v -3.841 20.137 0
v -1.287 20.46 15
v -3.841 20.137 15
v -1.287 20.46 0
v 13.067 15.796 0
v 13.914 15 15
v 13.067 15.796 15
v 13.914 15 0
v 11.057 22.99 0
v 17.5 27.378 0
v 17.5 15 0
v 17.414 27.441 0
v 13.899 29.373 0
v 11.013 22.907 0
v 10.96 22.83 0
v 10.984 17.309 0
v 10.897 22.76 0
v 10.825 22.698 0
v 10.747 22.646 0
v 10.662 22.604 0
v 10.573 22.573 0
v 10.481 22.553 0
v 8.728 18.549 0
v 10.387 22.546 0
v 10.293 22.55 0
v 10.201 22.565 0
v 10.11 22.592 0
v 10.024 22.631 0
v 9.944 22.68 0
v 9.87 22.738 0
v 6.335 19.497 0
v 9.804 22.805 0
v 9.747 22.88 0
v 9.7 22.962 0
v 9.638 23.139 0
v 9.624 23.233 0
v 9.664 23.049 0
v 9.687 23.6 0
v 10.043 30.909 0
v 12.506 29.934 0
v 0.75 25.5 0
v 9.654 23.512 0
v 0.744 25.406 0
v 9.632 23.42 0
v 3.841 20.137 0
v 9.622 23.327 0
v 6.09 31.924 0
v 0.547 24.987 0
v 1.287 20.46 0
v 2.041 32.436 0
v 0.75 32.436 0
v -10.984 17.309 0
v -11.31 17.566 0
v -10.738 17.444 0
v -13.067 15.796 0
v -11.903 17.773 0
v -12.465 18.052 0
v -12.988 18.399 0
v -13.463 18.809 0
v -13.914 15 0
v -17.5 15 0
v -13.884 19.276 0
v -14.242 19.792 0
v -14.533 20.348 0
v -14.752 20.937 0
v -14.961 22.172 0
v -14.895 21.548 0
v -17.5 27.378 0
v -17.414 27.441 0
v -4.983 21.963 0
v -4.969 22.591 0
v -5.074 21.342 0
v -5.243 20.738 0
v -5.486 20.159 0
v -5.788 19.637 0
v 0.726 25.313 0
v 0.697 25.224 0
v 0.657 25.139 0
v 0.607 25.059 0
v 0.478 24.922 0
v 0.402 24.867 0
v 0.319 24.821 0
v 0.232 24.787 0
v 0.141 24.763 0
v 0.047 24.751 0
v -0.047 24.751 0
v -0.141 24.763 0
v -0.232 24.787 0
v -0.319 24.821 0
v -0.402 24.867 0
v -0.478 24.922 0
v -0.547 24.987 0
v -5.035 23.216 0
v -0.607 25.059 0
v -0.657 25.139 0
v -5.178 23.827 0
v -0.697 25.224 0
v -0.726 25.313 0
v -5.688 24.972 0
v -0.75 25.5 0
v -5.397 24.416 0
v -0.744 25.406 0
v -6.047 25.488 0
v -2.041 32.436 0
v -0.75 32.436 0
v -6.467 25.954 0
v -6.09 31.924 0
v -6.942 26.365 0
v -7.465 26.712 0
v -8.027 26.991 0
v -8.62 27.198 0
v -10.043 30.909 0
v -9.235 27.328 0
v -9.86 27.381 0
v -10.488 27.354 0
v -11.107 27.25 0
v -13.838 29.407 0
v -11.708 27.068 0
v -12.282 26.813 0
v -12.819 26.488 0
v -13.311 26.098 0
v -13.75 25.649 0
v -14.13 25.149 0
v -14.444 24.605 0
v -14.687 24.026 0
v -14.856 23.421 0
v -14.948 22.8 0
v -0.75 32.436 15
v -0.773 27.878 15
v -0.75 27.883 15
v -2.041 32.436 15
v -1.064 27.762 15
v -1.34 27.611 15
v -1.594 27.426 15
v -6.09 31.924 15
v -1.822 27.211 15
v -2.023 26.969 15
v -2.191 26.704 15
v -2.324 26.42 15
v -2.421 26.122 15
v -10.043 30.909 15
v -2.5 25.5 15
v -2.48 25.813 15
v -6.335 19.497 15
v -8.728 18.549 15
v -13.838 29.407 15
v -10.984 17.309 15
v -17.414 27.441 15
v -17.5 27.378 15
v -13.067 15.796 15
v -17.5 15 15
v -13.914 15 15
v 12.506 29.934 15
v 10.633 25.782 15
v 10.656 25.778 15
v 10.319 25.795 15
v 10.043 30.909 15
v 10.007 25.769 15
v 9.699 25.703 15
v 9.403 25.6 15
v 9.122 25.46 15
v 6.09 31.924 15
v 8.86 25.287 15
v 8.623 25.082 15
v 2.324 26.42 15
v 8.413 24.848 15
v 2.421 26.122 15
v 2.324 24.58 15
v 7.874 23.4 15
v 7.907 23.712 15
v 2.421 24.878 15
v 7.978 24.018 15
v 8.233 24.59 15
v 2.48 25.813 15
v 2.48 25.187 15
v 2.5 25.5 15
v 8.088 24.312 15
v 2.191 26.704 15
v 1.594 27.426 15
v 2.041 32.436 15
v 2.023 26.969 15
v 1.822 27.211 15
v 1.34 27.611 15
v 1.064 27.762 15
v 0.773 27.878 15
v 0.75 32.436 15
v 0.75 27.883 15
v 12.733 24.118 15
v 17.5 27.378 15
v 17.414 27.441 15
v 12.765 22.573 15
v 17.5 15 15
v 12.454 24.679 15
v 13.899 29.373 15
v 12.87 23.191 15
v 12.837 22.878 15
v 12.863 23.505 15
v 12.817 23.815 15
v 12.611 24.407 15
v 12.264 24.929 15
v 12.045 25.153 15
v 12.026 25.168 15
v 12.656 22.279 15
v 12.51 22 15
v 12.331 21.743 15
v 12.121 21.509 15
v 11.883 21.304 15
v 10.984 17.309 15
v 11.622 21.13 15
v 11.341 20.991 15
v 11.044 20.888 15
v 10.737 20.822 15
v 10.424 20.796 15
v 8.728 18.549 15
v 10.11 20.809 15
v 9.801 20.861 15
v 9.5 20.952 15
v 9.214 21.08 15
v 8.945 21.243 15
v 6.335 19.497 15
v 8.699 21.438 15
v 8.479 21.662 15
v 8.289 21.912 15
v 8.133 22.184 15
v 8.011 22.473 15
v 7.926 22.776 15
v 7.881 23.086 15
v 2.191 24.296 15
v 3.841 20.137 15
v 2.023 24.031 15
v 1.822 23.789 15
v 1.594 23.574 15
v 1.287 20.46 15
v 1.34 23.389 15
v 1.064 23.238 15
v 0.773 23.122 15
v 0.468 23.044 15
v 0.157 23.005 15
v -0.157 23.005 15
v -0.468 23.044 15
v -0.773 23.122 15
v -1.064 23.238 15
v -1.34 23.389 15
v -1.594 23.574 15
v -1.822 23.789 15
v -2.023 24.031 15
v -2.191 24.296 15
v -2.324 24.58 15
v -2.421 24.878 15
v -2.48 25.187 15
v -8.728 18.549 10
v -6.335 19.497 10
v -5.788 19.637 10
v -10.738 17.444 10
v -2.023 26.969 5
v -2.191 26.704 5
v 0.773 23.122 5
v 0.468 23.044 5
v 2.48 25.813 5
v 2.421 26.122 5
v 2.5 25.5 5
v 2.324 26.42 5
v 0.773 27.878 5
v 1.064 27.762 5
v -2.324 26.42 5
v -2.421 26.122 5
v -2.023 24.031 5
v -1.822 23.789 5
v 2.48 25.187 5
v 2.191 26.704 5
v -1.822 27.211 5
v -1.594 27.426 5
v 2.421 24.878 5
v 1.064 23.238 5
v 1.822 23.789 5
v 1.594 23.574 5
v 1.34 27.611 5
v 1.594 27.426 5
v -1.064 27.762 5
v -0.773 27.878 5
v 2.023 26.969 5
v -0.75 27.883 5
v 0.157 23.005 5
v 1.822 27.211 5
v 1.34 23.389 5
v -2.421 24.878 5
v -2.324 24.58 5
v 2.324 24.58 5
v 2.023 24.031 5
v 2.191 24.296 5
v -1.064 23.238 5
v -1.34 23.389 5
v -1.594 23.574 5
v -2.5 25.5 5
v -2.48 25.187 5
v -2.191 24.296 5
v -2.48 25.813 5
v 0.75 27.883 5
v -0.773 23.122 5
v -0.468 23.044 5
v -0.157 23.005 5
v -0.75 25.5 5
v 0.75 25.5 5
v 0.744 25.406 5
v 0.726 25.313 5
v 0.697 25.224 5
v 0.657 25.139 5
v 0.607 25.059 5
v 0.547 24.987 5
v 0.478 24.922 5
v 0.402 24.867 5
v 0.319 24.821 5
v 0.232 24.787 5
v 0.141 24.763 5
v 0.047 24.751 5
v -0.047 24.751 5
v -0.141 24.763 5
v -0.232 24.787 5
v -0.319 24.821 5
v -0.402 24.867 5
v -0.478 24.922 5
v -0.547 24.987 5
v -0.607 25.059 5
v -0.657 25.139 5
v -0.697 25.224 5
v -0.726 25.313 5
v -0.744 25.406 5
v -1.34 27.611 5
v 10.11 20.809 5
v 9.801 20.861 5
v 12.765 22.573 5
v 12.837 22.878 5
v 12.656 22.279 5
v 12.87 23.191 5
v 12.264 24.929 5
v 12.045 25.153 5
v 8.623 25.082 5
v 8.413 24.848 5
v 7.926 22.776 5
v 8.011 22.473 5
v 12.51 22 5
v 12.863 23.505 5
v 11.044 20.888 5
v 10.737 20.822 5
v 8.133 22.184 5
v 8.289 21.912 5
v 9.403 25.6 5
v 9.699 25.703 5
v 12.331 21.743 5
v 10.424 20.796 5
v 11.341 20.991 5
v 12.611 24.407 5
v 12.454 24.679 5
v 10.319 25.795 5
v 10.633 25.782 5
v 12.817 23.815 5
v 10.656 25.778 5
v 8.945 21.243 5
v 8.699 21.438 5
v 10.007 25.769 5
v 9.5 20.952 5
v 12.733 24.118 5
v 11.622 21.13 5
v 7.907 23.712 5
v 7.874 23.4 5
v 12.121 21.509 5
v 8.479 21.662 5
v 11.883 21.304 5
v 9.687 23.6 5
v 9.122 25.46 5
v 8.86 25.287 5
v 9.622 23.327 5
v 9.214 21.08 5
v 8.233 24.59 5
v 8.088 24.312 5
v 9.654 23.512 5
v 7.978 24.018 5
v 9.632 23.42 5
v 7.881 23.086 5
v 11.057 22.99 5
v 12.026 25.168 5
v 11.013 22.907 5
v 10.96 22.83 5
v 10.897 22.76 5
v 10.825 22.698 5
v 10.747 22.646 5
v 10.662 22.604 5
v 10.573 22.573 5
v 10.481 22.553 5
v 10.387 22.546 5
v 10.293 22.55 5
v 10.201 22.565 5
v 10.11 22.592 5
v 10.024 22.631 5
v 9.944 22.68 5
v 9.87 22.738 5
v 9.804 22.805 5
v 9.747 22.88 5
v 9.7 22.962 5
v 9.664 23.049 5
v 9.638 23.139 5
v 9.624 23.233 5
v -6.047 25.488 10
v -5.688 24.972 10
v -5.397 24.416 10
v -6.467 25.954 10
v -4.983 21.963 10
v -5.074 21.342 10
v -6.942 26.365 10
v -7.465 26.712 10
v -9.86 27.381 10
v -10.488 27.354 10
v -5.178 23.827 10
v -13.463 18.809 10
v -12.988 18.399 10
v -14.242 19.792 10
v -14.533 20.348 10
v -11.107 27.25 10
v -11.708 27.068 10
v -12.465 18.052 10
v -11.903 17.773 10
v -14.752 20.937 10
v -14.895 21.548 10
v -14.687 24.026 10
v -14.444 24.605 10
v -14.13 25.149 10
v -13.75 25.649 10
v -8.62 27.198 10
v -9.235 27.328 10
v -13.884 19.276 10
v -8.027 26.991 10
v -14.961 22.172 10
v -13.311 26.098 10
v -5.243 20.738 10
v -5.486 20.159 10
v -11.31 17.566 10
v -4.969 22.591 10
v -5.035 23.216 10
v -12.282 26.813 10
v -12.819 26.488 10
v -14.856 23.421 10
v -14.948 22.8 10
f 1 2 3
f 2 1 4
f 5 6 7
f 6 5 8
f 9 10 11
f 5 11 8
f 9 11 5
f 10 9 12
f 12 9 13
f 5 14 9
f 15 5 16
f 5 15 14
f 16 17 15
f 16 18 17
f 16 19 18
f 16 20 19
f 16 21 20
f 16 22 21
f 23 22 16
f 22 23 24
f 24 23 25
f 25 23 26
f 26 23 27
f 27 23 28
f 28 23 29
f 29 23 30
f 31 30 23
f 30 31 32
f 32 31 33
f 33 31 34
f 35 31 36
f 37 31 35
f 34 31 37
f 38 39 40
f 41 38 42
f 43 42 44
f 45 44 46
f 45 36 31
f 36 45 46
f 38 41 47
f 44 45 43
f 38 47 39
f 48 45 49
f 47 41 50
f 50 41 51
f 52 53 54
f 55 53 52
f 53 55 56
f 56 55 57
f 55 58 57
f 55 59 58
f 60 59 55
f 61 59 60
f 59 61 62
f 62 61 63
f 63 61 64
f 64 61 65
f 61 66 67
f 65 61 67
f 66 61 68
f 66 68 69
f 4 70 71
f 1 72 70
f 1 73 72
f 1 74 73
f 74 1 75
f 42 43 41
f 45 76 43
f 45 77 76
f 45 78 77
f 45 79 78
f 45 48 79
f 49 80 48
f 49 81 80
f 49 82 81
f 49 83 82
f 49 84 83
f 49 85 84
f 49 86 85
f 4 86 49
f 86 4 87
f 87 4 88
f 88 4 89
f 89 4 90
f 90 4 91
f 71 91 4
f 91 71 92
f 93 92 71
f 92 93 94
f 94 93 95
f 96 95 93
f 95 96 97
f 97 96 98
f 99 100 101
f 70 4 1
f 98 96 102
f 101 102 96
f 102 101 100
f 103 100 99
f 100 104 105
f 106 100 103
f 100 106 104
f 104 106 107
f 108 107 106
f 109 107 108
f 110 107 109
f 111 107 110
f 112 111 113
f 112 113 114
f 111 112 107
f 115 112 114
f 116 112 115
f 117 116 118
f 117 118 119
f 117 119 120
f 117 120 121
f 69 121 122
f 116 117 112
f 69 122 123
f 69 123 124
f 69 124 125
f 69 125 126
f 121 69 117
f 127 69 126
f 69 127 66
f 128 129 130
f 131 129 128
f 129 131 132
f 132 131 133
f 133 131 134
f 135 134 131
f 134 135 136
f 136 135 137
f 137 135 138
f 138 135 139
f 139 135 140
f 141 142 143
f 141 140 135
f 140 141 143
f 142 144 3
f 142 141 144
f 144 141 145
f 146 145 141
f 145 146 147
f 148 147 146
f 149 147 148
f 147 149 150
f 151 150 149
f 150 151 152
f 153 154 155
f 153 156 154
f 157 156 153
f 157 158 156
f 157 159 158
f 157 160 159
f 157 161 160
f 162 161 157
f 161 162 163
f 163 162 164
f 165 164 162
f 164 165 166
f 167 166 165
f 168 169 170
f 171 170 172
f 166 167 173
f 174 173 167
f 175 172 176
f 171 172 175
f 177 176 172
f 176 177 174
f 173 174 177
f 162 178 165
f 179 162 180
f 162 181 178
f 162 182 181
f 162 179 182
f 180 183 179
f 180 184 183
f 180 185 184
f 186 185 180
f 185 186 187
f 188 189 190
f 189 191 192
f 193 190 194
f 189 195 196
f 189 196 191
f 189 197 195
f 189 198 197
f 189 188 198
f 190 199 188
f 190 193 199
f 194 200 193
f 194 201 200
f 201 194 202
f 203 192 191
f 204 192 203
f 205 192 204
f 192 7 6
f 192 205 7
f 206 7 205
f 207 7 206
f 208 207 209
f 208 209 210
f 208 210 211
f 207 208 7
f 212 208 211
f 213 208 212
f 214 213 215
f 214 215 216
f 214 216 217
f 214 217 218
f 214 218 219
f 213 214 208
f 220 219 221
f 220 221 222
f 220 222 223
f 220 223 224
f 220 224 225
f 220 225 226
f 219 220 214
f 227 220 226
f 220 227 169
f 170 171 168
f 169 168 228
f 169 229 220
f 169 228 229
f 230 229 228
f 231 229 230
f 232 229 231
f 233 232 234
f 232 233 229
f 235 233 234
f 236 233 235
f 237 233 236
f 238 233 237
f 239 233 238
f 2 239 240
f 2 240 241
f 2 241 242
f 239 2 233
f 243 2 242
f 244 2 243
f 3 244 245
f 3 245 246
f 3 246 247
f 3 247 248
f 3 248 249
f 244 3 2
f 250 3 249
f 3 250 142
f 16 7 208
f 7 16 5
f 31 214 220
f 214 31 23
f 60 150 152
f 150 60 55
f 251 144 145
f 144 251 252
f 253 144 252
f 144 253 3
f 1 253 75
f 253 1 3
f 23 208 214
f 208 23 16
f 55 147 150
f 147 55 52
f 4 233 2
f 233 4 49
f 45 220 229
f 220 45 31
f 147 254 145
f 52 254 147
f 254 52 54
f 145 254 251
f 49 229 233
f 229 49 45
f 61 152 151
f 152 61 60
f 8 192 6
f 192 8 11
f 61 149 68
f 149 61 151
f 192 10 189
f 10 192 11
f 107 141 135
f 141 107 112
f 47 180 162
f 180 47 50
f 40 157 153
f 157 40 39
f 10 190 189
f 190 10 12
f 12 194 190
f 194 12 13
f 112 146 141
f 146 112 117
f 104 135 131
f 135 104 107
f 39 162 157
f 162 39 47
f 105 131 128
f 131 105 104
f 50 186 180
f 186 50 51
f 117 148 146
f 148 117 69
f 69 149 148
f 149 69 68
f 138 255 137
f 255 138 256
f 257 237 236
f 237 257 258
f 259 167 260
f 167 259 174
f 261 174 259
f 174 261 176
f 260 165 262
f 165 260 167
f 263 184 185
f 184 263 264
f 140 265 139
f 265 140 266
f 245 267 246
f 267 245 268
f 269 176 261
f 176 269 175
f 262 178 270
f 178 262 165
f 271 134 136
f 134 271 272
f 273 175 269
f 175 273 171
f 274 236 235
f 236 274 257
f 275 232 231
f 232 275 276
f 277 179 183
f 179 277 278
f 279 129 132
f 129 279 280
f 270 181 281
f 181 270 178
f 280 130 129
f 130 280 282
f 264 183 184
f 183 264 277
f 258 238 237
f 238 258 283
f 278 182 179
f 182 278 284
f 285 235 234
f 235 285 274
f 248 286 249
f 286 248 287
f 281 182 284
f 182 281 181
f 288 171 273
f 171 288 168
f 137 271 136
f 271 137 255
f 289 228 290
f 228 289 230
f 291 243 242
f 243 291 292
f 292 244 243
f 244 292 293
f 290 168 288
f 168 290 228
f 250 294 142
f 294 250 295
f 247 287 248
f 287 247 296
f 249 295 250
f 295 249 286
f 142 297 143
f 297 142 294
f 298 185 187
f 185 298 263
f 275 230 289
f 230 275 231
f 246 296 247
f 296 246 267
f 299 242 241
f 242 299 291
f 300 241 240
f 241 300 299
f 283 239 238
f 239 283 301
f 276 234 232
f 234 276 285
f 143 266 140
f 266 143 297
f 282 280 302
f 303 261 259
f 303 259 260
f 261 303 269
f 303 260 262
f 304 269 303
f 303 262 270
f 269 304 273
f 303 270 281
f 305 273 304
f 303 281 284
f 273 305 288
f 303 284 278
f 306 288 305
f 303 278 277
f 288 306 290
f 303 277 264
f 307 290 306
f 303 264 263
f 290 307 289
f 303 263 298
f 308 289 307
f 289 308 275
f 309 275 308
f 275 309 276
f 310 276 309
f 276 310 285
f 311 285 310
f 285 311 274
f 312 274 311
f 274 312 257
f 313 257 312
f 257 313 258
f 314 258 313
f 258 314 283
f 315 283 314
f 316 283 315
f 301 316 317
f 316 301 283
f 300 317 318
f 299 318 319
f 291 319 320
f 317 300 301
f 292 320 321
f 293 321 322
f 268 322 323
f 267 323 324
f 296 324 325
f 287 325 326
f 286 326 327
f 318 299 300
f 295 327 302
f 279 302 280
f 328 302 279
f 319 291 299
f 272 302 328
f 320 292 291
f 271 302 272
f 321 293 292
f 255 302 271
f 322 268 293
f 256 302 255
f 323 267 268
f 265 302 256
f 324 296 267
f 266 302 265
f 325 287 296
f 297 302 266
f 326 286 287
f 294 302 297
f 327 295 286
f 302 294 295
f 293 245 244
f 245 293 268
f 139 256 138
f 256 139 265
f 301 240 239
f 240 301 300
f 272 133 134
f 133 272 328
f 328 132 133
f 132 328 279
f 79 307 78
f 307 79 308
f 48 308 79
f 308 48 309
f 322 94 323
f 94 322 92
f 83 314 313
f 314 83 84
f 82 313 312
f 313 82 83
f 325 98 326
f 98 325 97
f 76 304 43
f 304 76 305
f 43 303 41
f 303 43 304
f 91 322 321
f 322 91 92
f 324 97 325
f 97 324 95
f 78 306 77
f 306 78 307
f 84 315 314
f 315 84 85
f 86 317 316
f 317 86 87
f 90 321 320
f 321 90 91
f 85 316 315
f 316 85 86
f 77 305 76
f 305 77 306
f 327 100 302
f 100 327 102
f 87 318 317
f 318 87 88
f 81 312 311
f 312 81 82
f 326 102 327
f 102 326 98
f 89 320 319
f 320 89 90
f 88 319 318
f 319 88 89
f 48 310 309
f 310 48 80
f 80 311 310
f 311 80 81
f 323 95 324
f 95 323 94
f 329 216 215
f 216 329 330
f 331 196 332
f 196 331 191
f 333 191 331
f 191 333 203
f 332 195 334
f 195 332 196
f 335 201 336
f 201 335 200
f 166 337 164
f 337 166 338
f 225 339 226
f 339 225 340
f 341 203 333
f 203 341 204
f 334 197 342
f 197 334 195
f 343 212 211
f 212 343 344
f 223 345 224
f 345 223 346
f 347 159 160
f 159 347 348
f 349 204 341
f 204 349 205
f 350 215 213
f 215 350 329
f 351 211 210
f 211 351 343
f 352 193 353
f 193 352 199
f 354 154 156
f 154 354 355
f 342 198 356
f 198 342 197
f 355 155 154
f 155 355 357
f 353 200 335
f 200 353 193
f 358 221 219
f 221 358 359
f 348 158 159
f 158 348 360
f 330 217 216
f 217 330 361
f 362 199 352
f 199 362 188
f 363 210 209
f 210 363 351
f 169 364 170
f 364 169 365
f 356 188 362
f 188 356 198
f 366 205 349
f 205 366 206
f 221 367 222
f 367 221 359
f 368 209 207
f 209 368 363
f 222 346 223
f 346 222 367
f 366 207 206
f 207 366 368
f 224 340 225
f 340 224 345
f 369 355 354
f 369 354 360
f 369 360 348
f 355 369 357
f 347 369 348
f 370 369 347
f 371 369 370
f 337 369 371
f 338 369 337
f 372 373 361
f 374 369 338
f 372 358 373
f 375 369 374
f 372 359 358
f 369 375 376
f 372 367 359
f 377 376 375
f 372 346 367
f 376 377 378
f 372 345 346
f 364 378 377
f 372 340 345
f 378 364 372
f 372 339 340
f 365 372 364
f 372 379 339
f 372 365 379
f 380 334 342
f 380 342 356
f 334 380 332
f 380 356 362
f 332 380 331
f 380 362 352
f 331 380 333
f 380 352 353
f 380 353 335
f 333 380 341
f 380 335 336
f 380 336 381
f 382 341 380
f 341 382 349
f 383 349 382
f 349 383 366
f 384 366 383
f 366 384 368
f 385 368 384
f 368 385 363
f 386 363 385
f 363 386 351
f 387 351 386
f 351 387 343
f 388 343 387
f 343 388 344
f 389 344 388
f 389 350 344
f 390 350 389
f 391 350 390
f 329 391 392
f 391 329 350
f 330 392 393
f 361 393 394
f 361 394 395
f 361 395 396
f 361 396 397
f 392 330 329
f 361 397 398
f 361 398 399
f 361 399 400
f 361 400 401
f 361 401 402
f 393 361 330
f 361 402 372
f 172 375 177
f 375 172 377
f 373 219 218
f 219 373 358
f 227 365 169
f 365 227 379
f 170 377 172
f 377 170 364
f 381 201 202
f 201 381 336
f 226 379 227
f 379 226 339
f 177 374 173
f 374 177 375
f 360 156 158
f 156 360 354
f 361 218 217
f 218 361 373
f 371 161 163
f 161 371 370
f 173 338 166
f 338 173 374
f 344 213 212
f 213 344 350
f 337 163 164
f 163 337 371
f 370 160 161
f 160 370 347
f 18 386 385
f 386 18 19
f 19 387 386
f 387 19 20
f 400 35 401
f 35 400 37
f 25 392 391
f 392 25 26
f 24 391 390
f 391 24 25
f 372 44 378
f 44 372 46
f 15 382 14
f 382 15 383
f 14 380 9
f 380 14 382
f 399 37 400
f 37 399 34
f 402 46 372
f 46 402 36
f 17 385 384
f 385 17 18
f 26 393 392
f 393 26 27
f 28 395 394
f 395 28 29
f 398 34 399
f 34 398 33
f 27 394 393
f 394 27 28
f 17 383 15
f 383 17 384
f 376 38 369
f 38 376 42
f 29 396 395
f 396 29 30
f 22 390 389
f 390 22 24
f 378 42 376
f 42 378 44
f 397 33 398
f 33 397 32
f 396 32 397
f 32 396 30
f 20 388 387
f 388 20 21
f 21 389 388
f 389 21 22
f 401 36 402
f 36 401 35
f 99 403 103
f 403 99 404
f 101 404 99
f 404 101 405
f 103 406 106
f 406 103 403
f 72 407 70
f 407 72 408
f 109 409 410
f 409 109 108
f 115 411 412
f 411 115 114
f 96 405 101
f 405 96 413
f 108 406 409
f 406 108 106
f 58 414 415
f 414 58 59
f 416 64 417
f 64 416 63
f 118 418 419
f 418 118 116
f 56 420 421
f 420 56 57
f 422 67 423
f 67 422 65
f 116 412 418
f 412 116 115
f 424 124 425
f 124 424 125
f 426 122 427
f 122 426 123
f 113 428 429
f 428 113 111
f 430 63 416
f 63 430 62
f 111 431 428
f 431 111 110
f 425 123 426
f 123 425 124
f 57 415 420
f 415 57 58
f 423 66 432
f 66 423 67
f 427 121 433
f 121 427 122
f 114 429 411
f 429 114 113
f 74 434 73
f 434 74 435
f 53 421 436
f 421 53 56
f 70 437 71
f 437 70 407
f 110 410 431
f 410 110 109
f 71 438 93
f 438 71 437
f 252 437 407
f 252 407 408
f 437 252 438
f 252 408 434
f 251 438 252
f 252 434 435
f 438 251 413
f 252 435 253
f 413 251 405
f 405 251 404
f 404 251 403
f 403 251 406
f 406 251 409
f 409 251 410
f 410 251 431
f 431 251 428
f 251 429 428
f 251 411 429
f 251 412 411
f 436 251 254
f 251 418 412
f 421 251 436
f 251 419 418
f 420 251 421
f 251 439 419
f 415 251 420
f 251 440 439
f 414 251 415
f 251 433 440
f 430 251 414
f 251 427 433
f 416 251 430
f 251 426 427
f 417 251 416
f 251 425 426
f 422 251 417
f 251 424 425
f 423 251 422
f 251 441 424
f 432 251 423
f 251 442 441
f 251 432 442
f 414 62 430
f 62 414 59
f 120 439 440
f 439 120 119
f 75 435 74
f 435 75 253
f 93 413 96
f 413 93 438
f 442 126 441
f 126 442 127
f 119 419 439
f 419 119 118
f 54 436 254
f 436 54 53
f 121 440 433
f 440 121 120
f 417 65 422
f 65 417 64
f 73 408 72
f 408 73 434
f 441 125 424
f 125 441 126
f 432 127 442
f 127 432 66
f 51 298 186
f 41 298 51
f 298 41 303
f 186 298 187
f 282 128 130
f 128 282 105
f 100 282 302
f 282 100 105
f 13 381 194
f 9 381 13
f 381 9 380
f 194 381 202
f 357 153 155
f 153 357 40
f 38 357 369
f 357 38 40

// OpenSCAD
//tube diameters
D1=41; // original


//small hole diameters
d1=5; // hose
d2=6; 
d3=10; //existing clamp
$fn=50;


module shape_1(d_inner, d_outer, z){
    
    //D2 = D1 + 2* d3 + 4; //outer tube (for topmost bound)
    //Z = 15;
    SIDE_OFFS = 3;
    
    difference() {
        color("red")
        cylinder(d=d_outer, h=z);

        union() {
            //tube diameter
            color("blue")
            cylinder(d=d_inner, h=z);
            
            //bottom bound 
            translate([-(d_outer/2), -50,0])
            cube([d_outer, d_outer, z]);

            //left bound
            translate([-(d_inner/2)-20 + SIDE_OFFS,0,0])
                cube([20, d_outer, z]);

            //right bound
            translate([d_inner/2 - SIDE_OFFS,0,0])
                cube([20, d_outer, z]);
            
        }
    }
}

module cutout(z){
    zz = 10; //existing hole
    CUTOUT = 1.5;
    
    //left
    rotate([0,0,24])
    translate([0,(D1+d3)/2-1,0]) {        
//        translate([0,0,2]) {
//            cylinder(d=d1, h=z);                        
//        }
        cylinder(d=d3, h=zz);
//        cylinder(d=CUTOUT, h=z);
    }
    
    //rotate([0,0,24])
    //translate([-CUTOUT/2,(D1+d3)/2,0]) 
    //cube([CUTOUT,d3,z]);

    
    //middle
    translate([0,(D1+d3)/2,0]){
        translate([0,0,5]) {
            cylinder(d=d1, h=z);
        }
        cylinder(d=CUTOUT, h=z);
    }
        
    translate([-CUTOUT/2,(D1+d3)/2,0]) 
    cube([CUTOUT,d3,z]);
    
    //right

    rotate([0,0,-24])
    translate([0,(D1+d3)/2,0]){
        translate([0,0,5]) {
            cylinder(d=d1, h=z);
        }
        cylinder(d=CUTOUT, h=z);
    }

    rotate([0,0,-24])
    translate([-CUTOUT/2,(D1+d3)/2,0]) 
    cube([CUTOUT,d3,z]);

}



Z = 15;

difference(){
   shape_1(D1, D1 + 2* d3 + 4, Z);
    cutout(Z);
}

//translate([0,0,Z])
//shape_1(D1, D1 + 4, 4);

//color("red")
//cylinder(d=D1, h=15);
